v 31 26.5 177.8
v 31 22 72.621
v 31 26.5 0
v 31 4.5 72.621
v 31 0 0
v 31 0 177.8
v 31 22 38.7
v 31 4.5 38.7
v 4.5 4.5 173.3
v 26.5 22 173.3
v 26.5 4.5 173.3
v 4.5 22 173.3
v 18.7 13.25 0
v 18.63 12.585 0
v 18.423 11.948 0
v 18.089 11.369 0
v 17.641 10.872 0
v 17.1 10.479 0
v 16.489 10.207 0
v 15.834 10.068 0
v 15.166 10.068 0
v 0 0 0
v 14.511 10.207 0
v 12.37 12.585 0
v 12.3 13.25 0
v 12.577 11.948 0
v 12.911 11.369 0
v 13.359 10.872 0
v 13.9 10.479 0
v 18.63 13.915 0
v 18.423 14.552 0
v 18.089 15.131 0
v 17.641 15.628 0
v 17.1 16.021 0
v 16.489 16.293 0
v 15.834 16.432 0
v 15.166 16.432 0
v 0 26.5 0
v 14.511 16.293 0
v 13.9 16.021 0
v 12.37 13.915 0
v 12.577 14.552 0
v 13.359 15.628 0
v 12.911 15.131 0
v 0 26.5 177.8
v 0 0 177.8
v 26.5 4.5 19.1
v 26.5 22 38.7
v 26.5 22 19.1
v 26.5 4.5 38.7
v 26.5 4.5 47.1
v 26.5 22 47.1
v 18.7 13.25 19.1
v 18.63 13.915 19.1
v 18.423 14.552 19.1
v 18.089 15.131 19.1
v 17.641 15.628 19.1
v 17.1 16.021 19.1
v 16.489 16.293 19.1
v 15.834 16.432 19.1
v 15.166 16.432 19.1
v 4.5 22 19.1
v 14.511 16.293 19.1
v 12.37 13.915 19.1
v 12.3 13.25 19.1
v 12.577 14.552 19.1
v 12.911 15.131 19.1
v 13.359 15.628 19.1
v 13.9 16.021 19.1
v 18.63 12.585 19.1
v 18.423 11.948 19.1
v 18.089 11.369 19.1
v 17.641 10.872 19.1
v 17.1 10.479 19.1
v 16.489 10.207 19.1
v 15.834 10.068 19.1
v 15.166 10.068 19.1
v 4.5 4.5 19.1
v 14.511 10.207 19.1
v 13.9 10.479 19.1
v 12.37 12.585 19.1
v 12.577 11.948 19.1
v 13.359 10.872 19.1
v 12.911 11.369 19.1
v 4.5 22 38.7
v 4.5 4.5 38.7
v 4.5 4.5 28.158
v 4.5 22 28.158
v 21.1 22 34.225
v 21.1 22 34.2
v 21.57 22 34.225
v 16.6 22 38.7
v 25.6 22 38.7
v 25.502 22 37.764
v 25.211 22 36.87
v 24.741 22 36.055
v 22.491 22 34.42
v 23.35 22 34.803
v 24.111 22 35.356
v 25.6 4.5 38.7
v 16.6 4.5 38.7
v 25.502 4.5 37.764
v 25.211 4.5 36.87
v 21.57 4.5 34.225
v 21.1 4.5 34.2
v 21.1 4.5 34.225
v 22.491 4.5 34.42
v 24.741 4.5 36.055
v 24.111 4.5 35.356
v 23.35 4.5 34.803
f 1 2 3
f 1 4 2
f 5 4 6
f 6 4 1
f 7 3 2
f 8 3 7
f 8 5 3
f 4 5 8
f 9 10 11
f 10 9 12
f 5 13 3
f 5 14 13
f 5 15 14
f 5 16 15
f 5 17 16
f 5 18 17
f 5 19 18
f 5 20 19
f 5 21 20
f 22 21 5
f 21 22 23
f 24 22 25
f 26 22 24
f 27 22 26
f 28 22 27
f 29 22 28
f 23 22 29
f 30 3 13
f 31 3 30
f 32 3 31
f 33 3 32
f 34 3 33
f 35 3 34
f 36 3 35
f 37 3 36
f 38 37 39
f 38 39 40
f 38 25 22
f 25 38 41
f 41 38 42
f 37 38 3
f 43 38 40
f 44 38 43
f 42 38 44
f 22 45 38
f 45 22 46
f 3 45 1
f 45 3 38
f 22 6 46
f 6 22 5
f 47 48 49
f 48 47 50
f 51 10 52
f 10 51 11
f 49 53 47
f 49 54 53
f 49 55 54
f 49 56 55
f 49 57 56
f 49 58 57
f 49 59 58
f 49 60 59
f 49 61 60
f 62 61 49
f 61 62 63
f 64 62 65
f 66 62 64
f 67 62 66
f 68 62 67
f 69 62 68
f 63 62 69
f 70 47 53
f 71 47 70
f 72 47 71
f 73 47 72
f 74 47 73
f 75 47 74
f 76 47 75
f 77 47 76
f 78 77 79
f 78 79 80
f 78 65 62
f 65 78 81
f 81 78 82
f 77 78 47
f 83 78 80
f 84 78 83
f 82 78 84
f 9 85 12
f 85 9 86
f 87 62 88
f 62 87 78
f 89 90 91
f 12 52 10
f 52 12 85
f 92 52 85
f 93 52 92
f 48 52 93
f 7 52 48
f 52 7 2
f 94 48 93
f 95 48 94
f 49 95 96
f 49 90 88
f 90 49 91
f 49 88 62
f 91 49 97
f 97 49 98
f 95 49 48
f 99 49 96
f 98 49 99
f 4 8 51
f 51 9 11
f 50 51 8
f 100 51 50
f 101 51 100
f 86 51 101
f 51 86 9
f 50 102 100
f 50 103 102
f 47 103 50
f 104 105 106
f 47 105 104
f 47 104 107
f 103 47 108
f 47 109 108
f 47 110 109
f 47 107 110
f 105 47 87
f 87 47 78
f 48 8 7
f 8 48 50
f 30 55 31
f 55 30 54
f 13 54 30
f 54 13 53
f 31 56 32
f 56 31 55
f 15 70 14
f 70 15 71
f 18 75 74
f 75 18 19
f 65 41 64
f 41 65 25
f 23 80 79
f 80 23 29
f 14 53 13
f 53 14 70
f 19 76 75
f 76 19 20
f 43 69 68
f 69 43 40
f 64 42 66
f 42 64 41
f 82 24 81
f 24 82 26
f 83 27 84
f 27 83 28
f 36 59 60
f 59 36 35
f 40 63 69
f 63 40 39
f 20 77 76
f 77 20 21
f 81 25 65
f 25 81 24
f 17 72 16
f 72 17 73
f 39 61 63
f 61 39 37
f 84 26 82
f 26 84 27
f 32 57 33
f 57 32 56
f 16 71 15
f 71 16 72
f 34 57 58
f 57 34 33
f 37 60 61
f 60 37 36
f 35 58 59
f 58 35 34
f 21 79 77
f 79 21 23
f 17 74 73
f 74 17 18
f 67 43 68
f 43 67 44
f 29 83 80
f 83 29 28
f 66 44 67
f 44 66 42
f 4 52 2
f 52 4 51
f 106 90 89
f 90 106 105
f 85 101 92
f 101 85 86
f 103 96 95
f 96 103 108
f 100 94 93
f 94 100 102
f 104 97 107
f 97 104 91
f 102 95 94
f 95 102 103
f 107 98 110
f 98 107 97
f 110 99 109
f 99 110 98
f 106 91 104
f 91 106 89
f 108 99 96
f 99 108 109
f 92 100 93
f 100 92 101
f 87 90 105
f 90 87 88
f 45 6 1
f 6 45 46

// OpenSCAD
wall_thickness=4.5; //[0: 0.1 :10]
cap_height=38.7; //[0: 0.1 :100]
bottom_thickness=19.1; //[0: 0.1 :50]
windsheet_thickness=0.9; //[0: 0.1 :5]
mouth_height=8.4; //[0: 0.1 :50]
pipe_size=6.4;  //[0: 0.1 :20]
internal_width=17.5; //[0: 0.1 :100]
internal_depth=22.0; //[0: 0.1 :100]
internal_height=134.6; //[0: 0.1 :1000]
mouth_angle=10;  //[0: 0.1 :90]
windsheet_angle=20;  //[0: 0.1 :50]
capped="Yes"; //[Yes, No]

module pipe(wall_thickness, cap_height, bottom_thickness, windsheet_thickness, mouth_height, pipe_size, internal_width, internal_depth, internal_height, mouth_angle, windsheet_angle,capped);
    
    difference(){
        cube([(internal_depth+(2*wall_thickness)), (internal_width+(2*wall_thickness)), (internal_height+cap_height)]);
        translate([wall_thickness, wall_thickness, bottom_thickness]){
            cube([internal_depth, internal_width, (internal_height+cap_height-bottom_thickness+1)]);
        }
        translate([wall_thickness, wall_thickness, cap_height]){
            cube([(internal_depth+wall_thickness+1), internal_width, mouth_height]);
        }
        translate([((internal_depth+(2*wall_thickness))/2), ((internal_width+(2*wall_thickness))/2), -1]){
            cylinder(h=bottom_thickness+2, d=pipe_size, $fn=30);
        }
    translate([(internal_depth+wall_thickness), wall_thickness, (cap_height+mouth_height)]){
        rotate([0, mouth_angle, 0]){
            cube([wall_thickness, internal_width, internal_height]);
            }
        }
    }
    
    difference(){
        union(){
            translate([wall_thickness, wall_thickness, bottom_thickness]){
                cube([(internal_depth-windsheet_thickness-wall_thickness), internal_width, (cap_height-bottom_thickness)]);
            }
            translate([(internal_depth-windsheet_thickness), wall_thickness, cap_height]){
                rotate(a=-90, v=[1, 0, 0]){
                    cylinder(h=internal_width, r=wall_thickness, $fn=30);
                }
            }
        }
        translate([(internal_depth-wall_thickness-windsheet_thickness), wall_thickness-1, cap_height]){
            cube([(2*wall_thickness), internal_width+2, mouth_height]);
        }
        translate([(internal_depth-windsheet_thickness), wall_thickness-1, (cap_height-wall_thickness)]){
            rotate(a=-windsheet_angle-180, v=[0, 1, 0]){
                cube([internal_depth, internal_width+2, cap_height]);
            }
        }
    }
    
    if(capped=="Yes"){
        translate([0, 0, (internal_height+cap_height)]){
            cube([(internal_depth+(2*wall_thickness)), (internal_width+(2*wall_thickness)), wall_thickness]);
        }
    }
